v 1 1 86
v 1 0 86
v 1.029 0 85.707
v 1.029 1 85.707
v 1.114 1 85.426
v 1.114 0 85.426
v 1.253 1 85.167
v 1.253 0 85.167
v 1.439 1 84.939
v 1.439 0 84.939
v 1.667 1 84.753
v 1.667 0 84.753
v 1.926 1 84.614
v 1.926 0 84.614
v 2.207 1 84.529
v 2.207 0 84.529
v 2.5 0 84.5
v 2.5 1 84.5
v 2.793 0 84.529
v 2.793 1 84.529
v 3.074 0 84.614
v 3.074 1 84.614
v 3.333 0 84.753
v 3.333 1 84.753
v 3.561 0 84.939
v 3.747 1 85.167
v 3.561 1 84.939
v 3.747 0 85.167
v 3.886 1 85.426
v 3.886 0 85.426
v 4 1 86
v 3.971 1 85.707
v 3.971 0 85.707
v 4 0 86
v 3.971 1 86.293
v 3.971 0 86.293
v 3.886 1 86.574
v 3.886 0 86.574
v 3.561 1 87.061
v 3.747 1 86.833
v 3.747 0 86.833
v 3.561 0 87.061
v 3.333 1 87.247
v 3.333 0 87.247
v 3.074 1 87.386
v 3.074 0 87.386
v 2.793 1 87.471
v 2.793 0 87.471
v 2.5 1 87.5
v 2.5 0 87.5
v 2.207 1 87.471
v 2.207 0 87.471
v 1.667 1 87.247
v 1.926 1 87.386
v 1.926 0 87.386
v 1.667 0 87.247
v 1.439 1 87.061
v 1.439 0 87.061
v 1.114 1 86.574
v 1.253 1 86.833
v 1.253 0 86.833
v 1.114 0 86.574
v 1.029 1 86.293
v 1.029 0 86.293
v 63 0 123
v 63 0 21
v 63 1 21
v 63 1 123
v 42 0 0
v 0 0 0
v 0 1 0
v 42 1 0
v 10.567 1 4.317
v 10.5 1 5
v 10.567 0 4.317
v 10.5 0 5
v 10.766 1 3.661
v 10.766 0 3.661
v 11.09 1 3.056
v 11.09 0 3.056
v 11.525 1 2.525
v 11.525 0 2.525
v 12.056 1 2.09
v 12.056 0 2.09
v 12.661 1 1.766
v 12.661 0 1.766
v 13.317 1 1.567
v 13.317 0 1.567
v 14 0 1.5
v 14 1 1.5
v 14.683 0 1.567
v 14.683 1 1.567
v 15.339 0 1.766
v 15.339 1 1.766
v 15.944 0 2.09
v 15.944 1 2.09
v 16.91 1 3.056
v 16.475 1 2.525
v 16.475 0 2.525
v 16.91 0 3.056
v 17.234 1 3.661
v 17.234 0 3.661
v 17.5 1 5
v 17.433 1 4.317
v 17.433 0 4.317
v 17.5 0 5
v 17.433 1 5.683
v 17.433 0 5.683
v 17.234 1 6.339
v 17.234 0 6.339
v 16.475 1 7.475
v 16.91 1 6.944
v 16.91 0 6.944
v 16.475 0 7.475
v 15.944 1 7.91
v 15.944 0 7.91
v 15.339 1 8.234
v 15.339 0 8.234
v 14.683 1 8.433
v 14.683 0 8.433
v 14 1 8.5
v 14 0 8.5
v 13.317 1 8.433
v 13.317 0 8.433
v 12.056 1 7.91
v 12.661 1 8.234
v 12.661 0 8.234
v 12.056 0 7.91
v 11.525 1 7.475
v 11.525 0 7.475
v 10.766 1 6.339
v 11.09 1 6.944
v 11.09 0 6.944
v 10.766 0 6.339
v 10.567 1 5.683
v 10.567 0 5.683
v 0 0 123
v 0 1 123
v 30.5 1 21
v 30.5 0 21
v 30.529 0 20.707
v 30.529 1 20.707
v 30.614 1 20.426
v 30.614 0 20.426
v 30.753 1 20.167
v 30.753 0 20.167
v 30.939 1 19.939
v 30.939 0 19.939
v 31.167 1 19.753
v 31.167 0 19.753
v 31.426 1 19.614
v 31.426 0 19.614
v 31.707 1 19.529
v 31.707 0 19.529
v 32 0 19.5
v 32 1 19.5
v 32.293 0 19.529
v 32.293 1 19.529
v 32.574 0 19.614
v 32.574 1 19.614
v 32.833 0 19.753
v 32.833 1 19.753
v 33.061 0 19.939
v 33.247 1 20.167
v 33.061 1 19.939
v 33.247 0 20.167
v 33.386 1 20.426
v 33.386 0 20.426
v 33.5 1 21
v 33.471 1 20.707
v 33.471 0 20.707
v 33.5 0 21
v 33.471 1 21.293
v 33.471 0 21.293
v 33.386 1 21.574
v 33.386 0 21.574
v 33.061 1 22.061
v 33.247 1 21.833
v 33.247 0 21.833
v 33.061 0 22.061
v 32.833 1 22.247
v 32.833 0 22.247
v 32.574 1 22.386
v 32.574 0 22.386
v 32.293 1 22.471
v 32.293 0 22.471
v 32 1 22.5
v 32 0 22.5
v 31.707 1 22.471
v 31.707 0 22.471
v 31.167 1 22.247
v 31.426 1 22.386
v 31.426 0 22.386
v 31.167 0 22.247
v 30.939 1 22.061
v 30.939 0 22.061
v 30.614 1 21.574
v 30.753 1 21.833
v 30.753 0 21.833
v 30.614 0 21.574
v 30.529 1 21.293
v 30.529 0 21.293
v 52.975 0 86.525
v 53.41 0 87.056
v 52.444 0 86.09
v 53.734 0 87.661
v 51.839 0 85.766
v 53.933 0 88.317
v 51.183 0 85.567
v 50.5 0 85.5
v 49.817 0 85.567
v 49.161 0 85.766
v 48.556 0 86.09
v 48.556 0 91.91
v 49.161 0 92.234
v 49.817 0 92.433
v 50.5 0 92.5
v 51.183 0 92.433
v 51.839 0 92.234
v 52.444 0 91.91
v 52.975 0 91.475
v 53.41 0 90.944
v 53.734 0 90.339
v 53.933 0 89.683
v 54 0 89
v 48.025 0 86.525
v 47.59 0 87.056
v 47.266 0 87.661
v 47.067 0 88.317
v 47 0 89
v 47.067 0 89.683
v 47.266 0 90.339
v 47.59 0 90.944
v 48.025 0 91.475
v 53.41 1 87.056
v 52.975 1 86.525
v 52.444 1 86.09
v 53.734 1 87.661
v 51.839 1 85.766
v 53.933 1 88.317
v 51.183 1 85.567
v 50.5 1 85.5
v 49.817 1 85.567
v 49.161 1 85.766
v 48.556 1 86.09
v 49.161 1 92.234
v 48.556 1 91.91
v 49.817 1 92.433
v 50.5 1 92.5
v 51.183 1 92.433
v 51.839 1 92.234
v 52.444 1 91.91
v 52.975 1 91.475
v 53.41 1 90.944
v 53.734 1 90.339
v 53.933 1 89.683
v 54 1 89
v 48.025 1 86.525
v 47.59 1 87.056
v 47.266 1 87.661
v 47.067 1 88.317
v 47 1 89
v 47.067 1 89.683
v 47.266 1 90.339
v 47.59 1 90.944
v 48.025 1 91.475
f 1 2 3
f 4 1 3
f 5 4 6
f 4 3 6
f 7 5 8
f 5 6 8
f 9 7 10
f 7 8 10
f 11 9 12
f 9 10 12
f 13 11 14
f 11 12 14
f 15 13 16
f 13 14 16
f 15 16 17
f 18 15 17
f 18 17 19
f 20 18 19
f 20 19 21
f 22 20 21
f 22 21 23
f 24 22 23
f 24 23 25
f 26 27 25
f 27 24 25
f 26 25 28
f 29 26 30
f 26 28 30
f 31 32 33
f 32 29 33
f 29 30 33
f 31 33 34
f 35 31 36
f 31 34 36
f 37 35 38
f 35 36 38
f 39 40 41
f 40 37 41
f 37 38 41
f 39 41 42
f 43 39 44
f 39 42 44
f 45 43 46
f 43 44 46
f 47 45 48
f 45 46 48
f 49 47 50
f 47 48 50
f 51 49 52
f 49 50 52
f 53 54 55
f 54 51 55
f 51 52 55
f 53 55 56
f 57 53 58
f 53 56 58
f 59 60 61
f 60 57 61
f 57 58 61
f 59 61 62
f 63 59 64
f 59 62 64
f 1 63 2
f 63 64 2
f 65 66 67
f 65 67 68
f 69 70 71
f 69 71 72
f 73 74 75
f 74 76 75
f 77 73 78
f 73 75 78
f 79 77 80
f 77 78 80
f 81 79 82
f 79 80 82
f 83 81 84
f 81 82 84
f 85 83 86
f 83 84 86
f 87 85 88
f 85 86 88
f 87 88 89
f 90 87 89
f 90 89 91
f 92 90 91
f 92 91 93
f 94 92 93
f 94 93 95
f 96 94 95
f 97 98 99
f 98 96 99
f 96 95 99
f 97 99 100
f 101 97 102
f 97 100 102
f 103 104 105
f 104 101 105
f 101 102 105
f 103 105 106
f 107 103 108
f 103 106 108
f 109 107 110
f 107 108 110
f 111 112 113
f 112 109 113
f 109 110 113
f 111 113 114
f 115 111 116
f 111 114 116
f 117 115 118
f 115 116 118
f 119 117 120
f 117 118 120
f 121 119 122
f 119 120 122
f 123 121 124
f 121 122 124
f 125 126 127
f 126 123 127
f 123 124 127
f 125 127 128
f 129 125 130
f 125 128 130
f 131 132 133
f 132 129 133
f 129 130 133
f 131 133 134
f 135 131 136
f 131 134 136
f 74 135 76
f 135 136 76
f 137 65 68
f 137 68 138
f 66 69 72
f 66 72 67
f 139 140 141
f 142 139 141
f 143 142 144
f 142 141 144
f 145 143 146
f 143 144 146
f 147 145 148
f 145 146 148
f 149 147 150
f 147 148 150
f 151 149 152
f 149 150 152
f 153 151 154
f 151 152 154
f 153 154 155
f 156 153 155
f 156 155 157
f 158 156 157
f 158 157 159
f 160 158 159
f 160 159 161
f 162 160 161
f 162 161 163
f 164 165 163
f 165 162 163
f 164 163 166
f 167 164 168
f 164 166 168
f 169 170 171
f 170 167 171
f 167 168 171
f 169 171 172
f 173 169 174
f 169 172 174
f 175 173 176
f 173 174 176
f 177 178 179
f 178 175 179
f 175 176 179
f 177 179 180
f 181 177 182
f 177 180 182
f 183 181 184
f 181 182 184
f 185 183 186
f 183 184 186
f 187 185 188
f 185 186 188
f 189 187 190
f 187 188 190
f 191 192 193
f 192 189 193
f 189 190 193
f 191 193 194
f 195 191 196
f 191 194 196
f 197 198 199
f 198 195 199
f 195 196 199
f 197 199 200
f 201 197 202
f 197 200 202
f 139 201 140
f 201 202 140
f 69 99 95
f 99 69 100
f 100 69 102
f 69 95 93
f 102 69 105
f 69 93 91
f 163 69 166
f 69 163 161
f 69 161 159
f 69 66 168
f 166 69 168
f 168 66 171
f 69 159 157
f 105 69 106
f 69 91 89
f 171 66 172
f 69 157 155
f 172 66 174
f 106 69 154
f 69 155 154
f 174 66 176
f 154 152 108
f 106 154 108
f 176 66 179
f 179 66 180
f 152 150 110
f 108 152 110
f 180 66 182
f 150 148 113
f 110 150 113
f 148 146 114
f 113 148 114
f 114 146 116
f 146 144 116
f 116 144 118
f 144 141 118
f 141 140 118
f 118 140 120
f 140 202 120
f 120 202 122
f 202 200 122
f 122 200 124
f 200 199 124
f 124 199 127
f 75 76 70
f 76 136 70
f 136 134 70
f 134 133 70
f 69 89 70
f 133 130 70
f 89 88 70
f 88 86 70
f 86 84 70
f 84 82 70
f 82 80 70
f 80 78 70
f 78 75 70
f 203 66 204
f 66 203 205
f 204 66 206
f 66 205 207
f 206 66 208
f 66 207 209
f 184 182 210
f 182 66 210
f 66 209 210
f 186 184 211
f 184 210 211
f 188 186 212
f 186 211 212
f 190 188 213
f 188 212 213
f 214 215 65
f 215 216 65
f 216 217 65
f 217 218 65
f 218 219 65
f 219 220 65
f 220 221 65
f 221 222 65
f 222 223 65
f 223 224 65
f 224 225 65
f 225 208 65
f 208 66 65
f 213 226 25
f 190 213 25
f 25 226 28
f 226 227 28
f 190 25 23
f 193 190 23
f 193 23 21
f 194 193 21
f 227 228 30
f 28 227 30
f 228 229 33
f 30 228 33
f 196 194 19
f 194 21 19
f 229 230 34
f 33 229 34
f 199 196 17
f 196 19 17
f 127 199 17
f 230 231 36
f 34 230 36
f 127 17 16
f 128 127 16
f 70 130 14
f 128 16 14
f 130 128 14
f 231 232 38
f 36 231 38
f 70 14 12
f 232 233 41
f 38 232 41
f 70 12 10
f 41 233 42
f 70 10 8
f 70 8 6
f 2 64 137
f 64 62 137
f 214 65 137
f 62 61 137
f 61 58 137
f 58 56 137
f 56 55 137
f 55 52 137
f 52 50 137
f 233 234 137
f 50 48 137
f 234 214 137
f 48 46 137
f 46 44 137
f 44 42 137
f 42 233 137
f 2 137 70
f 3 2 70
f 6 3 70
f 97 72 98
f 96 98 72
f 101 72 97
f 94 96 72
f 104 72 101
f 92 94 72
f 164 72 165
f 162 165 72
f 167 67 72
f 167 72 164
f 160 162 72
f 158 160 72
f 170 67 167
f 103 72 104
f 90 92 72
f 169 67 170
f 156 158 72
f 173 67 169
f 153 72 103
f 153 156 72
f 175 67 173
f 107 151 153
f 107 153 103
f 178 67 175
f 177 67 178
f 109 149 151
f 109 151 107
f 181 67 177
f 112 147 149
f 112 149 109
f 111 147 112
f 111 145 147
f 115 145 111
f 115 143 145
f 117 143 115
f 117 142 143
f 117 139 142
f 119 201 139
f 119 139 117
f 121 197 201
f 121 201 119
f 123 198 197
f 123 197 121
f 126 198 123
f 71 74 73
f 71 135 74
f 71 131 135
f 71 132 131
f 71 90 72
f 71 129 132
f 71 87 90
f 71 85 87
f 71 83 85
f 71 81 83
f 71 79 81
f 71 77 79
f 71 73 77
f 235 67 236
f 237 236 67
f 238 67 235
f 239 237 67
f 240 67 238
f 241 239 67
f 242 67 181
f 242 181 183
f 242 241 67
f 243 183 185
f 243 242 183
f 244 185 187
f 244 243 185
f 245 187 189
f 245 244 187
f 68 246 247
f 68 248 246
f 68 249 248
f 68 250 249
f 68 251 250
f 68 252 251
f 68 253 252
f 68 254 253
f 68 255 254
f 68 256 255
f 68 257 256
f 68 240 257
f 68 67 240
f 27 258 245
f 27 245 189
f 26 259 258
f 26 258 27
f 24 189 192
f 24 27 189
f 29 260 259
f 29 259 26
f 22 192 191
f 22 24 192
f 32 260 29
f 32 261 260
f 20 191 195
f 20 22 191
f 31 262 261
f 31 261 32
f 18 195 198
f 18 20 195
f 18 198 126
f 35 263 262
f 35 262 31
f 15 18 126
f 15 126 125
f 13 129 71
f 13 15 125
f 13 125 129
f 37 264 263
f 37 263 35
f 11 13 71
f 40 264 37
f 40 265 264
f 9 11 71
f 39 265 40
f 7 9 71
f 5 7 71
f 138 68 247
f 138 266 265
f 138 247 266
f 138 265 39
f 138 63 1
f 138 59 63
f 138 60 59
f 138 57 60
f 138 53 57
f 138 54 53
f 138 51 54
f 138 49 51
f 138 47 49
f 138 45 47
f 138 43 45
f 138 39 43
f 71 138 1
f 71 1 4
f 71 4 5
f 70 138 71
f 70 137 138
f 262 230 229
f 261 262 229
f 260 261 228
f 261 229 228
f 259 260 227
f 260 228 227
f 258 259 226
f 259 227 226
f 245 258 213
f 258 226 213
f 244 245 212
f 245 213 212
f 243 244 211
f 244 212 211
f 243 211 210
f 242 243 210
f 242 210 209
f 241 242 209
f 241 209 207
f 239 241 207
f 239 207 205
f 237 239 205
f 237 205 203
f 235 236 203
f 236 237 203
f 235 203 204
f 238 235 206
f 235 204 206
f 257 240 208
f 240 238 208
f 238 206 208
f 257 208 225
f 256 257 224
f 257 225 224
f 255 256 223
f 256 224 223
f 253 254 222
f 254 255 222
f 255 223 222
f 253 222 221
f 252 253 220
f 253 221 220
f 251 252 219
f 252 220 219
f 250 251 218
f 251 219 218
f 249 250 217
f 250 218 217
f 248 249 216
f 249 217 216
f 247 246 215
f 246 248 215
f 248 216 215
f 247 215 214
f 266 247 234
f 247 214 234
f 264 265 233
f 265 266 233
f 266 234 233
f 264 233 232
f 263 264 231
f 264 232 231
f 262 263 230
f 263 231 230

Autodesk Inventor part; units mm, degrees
ref_plane "YZ Plane" through (0, 0, 0) normal (1, 0, 0) x (0, 1, 0)
ref_plane "XZ Plane" through (0, 0, 0) normal (0, 1, 0) x (-1, 0, 0)
ref_plane "XY Plane" through (0, 0, 0) normal (0, 0, 1) x (1, 0, 0)
sketch "Skizze1" plane through (0, 0, 0) normal (0, 1, 0) x (-1, 0, 0)
  line L0 (0, 0) -> (-42, 0)
  line L1 (-63, 21) -> (-63, 123)
  line L2 (-63, 123) -> (0, 123)
  line L3 (0, 123) -> (0, 0)
  line L4 (-42, 0) -> (-63, 21)
  line L5 (-42, 0) -> (-12.3015, 0) construction
  circle A0 centre (-14, 5) radius 3.5
  circle A1 centre (-32, 21) radius 1.5
  circle A2 centre (-2.5, 86) radius 1.5
  circle A3 centre (-50.5, 89) radius 3.5
  dimension "d0" = 63
  dimension "d1" = 102
  dimension "d2" = 135
  dimension "d3" = 42
  dimension "d4" = 7
  dimension "d5" = 3
  dimension "d6" = 3
  dimension "d7" = 7
  dimension "d8" = 2.5
  dimension "d9" = 37
  dimension "d10" = 14
  dimension "d11" = 5
  dimension "d12" = 21
  dimension "d13" = 32
  dimension "d14" = 12.5
  dimension "d15" = 34
extrude "Extrusion1" add sketch "Skizze1" along normal blind 1
properties part number "01_PCBoard"
